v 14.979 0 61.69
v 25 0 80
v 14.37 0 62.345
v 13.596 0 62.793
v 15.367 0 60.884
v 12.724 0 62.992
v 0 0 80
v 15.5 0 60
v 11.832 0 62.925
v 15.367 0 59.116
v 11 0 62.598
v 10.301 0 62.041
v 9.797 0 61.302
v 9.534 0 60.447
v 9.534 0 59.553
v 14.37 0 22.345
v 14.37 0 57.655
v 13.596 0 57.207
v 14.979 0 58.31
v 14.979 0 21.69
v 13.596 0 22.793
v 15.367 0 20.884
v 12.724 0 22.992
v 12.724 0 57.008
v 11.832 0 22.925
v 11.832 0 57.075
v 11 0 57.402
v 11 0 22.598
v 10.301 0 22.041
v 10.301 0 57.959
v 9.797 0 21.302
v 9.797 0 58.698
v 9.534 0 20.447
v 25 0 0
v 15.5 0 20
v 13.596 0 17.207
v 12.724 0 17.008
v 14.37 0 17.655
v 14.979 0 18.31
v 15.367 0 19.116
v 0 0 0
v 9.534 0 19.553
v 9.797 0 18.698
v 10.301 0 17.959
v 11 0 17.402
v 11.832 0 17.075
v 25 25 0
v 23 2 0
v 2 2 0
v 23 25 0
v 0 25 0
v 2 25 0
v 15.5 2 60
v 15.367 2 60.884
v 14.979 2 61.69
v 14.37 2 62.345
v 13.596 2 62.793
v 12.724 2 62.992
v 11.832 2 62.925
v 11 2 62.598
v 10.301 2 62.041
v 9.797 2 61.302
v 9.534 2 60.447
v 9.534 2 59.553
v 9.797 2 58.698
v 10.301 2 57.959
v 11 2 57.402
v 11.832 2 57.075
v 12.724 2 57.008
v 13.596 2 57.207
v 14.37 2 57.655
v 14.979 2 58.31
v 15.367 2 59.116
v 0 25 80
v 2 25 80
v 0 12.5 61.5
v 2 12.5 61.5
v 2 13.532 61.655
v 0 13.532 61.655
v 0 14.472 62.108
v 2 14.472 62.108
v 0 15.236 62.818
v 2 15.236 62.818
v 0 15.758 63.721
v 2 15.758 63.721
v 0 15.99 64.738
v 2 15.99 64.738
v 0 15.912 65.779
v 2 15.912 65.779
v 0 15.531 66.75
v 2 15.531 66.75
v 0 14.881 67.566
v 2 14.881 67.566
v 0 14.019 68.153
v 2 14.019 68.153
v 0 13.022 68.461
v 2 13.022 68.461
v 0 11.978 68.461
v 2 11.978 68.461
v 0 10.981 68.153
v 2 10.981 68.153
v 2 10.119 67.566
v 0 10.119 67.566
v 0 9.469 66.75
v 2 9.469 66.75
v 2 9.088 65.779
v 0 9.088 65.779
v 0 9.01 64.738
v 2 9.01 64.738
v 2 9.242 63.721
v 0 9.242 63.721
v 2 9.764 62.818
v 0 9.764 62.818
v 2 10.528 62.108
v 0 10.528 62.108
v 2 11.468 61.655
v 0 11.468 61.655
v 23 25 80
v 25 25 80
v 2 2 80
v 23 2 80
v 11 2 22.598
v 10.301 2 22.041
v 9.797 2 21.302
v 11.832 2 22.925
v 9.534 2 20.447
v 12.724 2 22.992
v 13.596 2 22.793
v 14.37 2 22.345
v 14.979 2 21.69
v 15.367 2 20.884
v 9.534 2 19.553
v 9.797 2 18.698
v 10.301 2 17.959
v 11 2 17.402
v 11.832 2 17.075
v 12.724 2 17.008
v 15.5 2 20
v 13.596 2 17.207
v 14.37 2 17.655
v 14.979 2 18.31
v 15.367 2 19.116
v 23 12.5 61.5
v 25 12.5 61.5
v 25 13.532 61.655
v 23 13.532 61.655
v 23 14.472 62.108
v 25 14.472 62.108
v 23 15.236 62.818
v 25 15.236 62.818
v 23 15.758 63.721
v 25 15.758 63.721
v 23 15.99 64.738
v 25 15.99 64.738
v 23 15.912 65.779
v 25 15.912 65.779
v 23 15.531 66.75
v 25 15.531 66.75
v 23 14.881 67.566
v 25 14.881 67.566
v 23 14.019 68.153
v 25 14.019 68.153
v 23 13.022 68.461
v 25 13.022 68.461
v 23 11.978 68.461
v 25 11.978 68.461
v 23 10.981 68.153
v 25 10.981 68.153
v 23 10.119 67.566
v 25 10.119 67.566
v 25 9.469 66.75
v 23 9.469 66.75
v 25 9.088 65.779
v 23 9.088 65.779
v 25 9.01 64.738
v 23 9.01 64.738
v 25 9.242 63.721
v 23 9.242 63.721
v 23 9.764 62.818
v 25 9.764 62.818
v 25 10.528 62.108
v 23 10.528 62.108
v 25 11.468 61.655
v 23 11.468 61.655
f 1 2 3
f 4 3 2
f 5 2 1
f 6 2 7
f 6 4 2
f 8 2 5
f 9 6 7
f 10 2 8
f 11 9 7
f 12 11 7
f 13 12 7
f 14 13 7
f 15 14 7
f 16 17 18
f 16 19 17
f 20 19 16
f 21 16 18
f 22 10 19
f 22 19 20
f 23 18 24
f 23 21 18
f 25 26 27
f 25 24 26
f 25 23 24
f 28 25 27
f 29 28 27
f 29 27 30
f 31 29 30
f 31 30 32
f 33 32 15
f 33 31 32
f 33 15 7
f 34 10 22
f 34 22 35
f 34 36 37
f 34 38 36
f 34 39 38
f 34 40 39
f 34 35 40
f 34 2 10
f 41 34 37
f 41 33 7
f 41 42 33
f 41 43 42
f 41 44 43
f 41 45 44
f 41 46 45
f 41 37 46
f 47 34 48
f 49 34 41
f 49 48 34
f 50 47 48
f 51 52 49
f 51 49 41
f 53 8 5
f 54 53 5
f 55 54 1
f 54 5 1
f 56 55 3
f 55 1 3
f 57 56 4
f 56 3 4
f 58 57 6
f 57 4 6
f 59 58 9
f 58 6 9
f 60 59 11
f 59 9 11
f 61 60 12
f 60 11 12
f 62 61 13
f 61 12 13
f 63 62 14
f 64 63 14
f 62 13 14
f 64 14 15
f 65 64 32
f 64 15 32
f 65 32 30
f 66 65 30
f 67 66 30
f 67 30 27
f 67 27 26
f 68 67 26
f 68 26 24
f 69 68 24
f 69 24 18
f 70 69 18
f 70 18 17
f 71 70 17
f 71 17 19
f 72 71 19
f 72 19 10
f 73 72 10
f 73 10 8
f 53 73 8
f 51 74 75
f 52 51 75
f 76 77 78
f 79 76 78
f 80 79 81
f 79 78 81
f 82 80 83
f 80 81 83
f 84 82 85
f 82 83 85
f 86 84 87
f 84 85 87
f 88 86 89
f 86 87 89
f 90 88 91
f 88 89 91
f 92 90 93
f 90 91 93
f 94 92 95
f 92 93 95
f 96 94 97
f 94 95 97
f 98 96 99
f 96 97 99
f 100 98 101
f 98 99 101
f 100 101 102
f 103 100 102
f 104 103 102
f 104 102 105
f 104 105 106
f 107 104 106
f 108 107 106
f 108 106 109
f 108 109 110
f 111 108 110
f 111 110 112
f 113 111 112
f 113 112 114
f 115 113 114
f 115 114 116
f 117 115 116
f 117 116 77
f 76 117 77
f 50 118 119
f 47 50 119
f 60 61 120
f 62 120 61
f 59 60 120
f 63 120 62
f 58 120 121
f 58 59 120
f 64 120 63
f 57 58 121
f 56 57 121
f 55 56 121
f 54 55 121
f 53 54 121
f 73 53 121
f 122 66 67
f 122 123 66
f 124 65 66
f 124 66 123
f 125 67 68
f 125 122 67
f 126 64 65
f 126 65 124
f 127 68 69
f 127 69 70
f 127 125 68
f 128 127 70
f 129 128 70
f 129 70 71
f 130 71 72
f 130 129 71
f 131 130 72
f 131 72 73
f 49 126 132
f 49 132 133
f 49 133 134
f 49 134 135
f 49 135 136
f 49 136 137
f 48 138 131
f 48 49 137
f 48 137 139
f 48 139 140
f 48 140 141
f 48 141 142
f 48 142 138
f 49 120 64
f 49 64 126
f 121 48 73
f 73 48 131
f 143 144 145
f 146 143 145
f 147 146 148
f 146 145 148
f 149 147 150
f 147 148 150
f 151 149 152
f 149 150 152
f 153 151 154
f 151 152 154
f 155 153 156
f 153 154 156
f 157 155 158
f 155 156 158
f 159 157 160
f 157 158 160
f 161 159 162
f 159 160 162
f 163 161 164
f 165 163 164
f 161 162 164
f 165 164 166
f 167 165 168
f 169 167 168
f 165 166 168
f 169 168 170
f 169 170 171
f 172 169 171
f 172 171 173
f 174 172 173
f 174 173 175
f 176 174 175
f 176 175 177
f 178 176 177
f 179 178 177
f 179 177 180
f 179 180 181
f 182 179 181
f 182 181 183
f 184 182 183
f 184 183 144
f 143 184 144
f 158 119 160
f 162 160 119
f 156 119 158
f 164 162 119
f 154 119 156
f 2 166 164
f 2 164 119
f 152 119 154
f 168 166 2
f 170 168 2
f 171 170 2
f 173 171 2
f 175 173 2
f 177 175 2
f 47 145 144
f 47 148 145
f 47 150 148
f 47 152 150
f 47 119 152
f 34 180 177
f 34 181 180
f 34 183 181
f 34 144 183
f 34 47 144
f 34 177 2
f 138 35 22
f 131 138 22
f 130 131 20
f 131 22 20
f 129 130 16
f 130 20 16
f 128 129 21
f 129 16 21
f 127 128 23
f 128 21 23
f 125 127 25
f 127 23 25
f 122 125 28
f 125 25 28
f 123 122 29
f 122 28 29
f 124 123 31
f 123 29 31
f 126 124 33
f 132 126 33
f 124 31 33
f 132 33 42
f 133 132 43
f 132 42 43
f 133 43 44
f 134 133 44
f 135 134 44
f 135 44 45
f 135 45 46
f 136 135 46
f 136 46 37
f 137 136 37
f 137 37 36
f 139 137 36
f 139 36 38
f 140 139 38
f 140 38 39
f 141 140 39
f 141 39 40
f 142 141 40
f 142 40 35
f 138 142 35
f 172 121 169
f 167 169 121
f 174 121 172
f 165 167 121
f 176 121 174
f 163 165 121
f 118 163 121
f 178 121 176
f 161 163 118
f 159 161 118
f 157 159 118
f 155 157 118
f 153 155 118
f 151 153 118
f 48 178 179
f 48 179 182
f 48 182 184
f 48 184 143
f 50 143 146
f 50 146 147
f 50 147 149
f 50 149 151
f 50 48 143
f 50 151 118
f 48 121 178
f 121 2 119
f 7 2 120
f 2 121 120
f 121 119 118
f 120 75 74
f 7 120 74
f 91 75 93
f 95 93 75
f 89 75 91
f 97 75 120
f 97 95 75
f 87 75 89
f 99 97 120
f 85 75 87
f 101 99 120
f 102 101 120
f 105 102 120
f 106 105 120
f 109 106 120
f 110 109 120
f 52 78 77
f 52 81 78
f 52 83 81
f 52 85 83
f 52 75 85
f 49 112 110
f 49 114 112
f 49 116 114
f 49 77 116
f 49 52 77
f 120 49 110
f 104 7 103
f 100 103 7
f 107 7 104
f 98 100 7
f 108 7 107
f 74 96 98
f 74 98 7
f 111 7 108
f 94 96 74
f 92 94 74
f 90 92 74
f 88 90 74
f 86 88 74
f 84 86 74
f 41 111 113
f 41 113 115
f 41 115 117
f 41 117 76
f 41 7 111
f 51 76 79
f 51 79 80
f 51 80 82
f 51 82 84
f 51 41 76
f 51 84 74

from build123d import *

# Parameters (mm, degrees)
BOSS_EXTRUDE1_DEPTH = 80
SKETCH3_R           = 3.5
CUT_EXTRUDE1_DEPTH  = 25
CUT_EXTRUDE2_REACH  = 27
SKETCH4_R           = 3


with BuildPart() as part:
    # Sketch2 → Boss-Extrude1 (new body)
    with BuildSketch(Plane.XY):
        Polygon((23, 25), (25, 25), (25, 0), (0, 0), (0, 25), (2, 25), (2, 2), (23, 2), align=None)
    extrude(amount=BOSS_EXTRUDE1_DEPTH)

    # Sketch3 → Cut-Extrude1 (cut)
    with BuildSketch(Plane(origin=(25, 0, 0), x_dir=(0, 0, -1), z_dir=(1, 0, 0))):
        with Locations((-65, 12.5)):
            Circle(SKETCH3_R)
    extrude(amount=-CUT_EXTRUDE1_DEPTH, mode=Mode.SUBTRACT)

    # Sketch4 → Cut-Extrude2 (cut, up to next)
    with BuildSketch(Plane.XZ, mode=Mode.PRIVATE) as cut_extrude2_sk1:
        with Locations((12.5, 60)):
            Circle(SKETCH4_R)
    cut_extrude2_tool1 = extrude(cut_extrude2_sk1.sketch, amount=-CUT_EXTRUDE2_REACH, mode=Mode.PRIVATE) & part.part
    add(cut_extrude2_tool1.solids().sort_by_distance((12.5, 0, 60))[0], mode=Mode.SUBTRACT)
    # Sketch4 → Cut-Extrude2 (cut, up to next)
    with BuildSketch(Plane.XZ, mode=Mode.PRIVATE) as cut_extrude2_sk2:
        with Locations((12.5, 20)):
            Circle(SKETCH4_R)
    cut_extrude2_tool2 = extrude(cut_extrude2_sk2.sketch, amount=-CUT_EXTRUDE2_REACH, mode=Mode.PRIVATE) & part.part
    add(cut_extrude2_tool2.solids().sort_by_distance((12.5, 0, 20))[0], mode=Mode.SUBTRACT)


solid = part.part
